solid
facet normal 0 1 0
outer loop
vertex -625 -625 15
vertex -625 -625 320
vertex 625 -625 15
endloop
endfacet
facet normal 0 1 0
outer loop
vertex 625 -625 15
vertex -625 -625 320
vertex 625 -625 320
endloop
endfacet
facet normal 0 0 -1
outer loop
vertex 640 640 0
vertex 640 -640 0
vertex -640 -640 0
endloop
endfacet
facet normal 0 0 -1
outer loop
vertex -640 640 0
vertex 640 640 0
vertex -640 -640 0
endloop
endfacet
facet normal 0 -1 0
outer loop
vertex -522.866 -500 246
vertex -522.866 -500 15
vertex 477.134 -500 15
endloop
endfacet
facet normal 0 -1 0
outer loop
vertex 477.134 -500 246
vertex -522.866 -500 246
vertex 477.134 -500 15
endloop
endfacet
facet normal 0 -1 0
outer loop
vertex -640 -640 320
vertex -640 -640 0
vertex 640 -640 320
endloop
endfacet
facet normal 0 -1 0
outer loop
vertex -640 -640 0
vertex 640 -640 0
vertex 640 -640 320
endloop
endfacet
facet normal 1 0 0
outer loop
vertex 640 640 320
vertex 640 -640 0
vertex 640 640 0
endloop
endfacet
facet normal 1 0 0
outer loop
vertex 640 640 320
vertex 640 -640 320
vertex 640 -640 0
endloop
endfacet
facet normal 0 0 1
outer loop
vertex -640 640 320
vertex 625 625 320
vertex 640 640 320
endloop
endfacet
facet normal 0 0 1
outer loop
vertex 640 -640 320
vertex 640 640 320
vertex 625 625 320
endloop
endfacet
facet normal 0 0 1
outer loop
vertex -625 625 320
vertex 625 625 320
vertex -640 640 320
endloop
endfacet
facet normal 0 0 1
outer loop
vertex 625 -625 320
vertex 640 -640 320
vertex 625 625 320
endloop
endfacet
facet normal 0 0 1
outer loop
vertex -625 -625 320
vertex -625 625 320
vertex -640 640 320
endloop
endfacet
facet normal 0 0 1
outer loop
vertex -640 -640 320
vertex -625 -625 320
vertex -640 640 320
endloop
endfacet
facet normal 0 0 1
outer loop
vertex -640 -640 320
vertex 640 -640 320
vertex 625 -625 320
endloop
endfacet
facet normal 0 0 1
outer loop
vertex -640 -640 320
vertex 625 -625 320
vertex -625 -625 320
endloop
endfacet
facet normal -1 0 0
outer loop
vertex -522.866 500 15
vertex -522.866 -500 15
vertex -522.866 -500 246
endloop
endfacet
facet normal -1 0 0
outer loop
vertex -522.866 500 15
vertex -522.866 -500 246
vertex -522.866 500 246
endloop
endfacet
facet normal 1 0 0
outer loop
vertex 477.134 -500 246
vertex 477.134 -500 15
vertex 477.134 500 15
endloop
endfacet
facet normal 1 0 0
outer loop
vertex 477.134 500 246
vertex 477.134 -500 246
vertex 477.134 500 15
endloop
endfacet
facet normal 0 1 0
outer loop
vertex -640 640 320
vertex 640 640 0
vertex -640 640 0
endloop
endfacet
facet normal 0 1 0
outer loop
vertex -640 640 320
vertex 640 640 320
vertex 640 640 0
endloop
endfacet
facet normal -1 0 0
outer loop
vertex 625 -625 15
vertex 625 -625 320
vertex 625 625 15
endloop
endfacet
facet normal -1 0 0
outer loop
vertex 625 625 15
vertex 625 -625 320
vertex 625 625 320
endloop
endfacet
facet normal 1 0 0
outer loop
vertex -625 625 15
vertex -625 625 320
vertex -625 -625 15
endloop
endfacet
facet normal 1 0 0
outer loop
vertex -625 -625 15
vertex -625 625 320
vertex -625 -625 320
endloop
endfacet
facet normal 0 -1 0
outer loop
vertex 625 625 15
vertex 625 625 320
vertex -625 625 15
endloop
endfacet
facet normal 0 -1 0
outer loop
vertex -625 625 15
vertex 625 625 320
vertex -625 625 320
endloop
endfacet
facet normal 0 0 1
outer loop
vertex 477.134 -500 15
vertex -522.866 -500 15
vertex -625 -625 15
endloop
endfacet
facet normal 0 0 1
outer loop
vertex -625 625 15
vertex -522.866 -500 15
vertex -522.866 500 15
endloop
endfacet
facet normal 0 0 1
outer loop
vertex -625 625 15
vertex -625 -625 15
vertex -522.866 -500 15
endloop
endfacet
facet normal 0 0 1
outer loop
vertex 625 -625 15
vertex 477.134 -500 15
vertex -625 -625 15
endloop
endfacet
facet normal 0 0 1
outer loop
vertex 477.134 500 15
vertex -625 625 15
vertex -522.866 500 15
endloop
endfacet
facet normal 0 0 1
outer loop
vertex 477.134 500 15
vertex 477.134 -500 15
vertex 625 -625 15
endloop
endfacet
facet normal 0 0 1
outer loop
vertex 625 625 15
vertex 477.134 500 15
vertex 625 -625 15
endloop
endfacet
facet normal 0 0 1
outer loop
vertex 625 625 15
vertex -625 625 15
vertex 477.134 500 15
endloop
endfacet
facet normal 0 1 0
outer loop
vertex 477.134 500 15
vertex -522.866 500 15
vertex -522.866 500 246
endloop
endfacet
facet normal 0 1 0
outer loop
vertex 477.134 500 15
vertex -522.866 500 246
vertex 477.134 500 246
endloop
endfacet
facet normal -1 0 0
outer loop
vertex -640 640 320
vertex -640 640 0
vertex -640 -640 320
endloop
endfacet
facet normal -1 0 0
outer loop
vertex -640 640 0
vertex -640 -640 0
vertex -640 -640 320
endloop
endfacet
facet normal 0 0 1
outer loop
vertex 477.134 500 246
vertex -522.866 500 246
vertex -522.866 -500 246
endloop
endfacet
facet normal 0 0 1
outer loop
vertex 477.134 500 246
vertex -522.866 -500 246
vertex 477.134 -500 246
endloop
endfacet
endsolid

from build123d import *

# Parameters (mm, degrees)
F0_W      = 1250
F0_H      = 1250
F1_DEPTH  = 15
F2_W      = 1265
F2_H      = 320
F6_DEPTH  = 15
F3_W      = 1265
F3_H      = 320
F7_DEPTH  = 15
F4_W      = 1265
F4_H      = 320
F8_DEPTH  = 15
F5_W      = 1265
F5_H      = 320
F9_DEPTH  = 15
F11_W     = 1000
F11_H     = 1000
F12_DEPTH = 231


with BuildPart() as f1:
    # F0 (on Top) → F1 (new body)
    with BuildSketch(Plane.XY):
        Rectangle(F0_W, F0_H)
    extrude(amount=F1_DEPTH)

    # F2 (on face) → F6 (join)
    with BuildSketch(Plane.XZ.offset(625)):
        with Locations((7.5, 160)):
            Rectangle(F2_W, F2_H)
    extrude(amount=F6_DEPTH)

    # F3 (on face) → F7 (join)
    with BuildSketch(Plane.YZ.offset(625)):
        with Locations((7.5, 160)):
            Rectangle(F3_W, F3_H)
    extrude(amount=F7_DEPTH)

    # F4 (on face) → F8 (join)
    with BuildSketch(Plane(origin=(-625, 0, 0), x_dir=(0, -1, 0), z_dir=(-1, 0, 0))):
        with Locations((7.5, 160)):
            Rectangle(F4_W, F4_H)
    extrude(amount=F8_DEPTH)

    # F5 (on face) → F9 (join)
    with BuildSketch(Plane(origin=(0, 625, 0), x_dir=(-1, 0, 0), z_dir=(0, 1, 0))):
        with Locations((7.5, 160)):
            Rectangle(F5_W, F5_H)
    extrude(amount=F9_DEPTH)

    # F11 (on face) → F12 (join)
    with BuildSketch(Plane.XY.offset(15)):
        with Locations((-22.866359, 0)):
            Rectangle(F11_W, F11_H)
    extrude(amount=F12_DEPTH)


solid = f1.part
